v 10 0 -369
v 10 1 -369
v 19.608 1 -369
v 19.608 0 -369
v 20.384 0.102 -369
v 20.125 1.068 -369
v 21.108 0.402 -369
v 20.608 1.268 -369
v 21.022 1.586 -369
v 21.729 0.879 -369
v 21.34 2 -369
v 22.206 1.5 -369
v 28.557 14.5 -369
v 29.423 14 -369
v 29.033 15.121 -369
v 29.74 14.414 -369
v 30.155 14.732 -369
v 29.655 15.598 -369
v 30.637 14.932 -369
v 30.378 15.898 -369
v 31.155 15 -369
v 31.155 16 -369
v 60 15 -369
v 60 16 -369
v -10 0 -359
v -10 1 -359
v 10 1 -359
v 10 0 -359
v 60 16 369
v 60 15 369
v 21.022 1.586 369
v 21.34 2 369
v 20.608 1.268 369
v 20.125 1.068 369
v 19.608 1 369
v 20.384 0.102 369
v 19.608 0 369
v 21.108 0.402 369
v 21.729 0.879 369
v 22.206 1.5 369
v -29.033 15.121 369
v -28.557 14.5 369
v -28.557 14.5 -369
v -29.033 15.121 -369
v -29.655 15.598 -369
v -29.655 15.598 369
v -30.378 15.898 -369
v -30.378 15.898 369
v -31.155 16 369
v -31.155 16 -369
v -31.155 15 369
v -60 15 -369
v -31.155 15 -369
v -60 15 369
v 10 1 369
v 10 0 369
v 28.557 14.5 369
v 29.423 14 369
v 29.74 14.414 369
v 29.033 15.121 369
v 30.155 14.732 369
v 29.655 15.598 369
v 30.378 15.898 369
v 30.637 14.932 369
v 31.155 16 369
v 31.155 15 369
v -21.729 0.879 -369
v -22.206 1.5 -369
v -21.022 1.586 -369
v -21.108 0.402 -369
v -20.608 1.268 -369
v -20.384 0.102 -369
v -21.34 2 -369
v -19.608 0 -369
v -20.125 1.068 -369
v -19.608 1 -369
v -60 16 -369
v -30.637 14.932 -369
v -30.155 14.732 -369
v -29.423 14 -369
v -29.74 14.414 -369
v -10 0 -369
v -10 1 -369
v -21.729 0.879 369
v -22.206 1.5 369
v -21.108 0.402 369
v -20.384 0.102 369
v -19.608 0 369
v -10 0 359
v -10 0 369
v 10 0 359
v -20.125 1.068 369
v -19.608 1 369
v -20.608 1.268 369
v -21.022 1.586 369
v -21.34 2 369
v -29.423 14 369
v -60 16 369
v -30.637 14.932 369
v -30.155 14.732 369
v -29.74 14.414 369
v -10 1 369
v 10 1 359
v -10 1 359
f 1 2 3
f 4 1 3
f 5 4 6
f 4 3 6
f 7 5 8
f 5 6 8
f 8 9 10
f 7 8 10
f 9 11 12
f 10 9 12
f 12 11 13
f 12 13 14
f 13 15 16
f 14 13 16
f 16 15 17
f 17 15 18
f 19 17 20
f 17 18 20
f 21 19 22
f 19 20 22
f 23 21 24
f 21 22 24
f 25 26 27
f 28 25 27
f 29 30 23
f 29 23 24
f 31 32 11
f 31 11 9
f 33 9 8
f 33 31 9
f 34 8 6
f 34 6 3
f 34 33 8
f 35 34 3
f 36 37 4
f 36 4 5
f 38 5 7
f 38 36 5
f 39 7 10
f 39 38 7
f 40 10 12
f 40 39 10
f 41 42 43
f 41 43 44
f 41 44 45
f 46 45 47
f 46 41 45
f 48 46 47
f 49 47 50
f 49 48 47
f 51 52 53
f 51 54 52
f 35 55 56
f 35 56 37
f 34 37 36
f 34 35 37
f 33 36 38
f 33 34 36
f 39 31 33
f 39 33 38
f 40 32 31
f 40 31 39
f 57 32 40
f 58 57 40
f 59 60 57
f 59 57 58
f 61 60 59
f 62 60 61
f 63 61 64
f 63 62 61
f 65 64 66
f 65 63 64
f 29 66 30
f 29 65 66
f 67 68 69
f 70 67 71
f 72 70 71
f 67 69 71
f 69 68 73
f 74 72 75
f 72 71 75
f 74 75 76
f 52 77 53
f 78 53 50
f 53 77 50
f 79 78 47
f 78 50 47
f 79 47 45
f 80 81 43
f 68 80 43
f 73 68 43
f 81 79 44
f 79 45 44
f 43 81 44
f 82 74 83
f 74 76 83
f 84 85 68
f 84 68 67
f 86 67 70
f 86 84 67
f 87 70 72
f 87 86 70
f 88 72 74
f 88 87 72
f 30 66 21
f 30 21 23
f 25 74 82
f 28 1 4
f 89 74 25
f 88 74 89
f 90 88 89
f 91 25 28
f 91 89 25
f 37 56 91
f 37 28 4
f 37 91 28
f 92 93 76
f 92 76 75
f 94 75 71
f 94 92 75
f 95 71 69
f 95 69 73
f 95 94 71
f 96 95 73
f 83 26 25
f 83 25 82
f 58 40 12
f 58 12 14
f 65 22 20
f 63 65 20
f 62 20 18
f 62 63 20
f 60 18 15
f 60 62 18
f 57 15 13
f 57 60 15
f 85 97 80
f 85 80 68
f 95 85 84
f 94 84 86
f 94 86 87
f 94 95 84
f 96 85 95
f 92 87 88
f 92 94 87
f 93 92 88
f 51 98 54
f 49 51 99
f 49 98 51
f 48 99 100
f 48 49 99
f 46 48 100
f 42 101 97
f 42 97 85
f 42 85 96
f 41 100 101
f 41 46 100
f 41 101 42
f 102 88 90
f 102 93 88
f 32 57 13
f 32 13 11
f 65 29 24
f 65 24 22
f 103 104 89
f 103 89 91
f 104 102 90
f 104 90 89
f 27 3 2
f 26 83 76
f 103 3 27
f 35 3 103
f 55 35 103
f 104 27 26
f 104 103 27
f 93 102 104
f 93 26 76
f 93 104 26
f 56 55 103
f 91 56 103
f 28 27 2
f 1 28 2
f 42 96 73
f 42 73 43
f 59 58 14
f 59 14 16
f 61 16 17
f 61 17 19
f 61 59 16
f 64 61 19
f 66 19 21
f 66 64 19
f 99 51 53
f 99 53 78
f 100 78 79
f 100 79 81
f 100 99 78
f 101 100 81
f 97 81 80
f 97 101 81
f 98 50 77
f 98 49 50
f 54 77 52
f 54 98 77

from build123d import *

# Parameters (mm, degrees)
BASE_FLANGE1_DEPTH = 369
CUT_EXTRUDE1_REACH = 376.147
SKETCH2_W          = 20
SKETCH2_H          = 10


# Sheet-metal steps are written as plain solids
with BuildPart() as part:
    # Sketch1 → Base-Flange1 (new, symmetric)
    with BuildSketch(Plane.XY):
        with BuildLine():
            Line((-60, 15), (-31.154700538, 15))
            ThreePointArc((-31.154700538, 15), (-30.154700538, 14.732050808), (-29.422649731, 14))
            Line((-29.422649731, 14), (-22.205771366, 1.5))
            ThreePointArc((-22.205771366, 1.5), (-21.107695155, 0.401923789), (-19.607695155, 0))
            Line((-19.607695155, 0), (19.607695155, 0))
            ThreePointArc((19.607695155, 0), (21.107695155, 0.401923789), (22.205771366, 1.5))
            Line((22.205771366, 1.5), (29.422649731, 14))
            ThreePointArc((29.422649731, 14), (30.154700538, 14.732050808), (31.154700538, 15))
            Line((31.154700538, 15), (60, 15))
            Line((60, 15), (60, 16))
            Line((60, 16), (31.154700538, 16))
            ThreePointArc((31.154700538, 16), (29.654700538, 15.598076211), (28.556624327, 14.5))
            Line((28.556624327, 14.5), (21.339745962, 2))
            ThreePointArc((21.339745962, 2), (20.607695155, 1.267949192), (19.607695155, 1))
            Line((19.607695155, 1), (-19.607695155, 1))
            ThreePointArc((-19.607695155, 1), (-20.607695155, 1.267949192), (-21.339745962, 2))
            Line((-21.339745962, 2), (-28.556624327, 14.5))
            ThreePointArc((-28.556624327, 14.5), (-29.654700538, 15.598076211), (-31.154700538, 16))
            Line((-31.154700538, 16), (-60, 16))
            Line((-60, 16), (-60, 15))
        make_face()
    extrude(amount=BASE_FLANGE1_DEPTH, both=True)

    # Sketch2 → Cut-Extrude1 (cut, up to next)
    with BuildSketch(Plane(origin=(0, 1, 0), x_dir=(1, 0, 0), z_dir=(0, 1, 0)), mode=Mode.PRIVATE) as cut_extrude1_sk1:
        with Locations((0, 364)):
            Rectangle(SKETCH2_W, SKETCH2_H)
    cut_extrude1_tool1 = extrude(cut_extrude1_sk1.sketch, amount=-CUT_EXTRUDE1_REACH, mode=Mode.PRIVATE) & part.part
    # Sketch2 → Cut-Extrude1 (cut, up to next)
    with BuildSketch(Plane(origin=(0, 1, 0), x_dir=(1, 0, 0), z_dir=(0, 1, 0)), mode=Mode.PRIVATE) as cut_extrude1_sk2:
        with Locations((0, -364)):
            Rectangle(SKETCH2_W, SKETCH2_H)
    cut_extrude1_tool2 = extrude(cut_extrude1_sk2.sketch, amount=-CUT_EXTRUDE1_REACH, mode=Mode.PRIVATE) & part.part
    add(cut_extrude1_tool1.solids().sort_by_distance((0, 1, -364))[0], mode=Mode.SUBTRACT)
    add(cut_extrude1_tool2.solids().sort_by_distance((0, 1, 364))[0], mode=Mode.SUBTRACT)


solid = part.part
